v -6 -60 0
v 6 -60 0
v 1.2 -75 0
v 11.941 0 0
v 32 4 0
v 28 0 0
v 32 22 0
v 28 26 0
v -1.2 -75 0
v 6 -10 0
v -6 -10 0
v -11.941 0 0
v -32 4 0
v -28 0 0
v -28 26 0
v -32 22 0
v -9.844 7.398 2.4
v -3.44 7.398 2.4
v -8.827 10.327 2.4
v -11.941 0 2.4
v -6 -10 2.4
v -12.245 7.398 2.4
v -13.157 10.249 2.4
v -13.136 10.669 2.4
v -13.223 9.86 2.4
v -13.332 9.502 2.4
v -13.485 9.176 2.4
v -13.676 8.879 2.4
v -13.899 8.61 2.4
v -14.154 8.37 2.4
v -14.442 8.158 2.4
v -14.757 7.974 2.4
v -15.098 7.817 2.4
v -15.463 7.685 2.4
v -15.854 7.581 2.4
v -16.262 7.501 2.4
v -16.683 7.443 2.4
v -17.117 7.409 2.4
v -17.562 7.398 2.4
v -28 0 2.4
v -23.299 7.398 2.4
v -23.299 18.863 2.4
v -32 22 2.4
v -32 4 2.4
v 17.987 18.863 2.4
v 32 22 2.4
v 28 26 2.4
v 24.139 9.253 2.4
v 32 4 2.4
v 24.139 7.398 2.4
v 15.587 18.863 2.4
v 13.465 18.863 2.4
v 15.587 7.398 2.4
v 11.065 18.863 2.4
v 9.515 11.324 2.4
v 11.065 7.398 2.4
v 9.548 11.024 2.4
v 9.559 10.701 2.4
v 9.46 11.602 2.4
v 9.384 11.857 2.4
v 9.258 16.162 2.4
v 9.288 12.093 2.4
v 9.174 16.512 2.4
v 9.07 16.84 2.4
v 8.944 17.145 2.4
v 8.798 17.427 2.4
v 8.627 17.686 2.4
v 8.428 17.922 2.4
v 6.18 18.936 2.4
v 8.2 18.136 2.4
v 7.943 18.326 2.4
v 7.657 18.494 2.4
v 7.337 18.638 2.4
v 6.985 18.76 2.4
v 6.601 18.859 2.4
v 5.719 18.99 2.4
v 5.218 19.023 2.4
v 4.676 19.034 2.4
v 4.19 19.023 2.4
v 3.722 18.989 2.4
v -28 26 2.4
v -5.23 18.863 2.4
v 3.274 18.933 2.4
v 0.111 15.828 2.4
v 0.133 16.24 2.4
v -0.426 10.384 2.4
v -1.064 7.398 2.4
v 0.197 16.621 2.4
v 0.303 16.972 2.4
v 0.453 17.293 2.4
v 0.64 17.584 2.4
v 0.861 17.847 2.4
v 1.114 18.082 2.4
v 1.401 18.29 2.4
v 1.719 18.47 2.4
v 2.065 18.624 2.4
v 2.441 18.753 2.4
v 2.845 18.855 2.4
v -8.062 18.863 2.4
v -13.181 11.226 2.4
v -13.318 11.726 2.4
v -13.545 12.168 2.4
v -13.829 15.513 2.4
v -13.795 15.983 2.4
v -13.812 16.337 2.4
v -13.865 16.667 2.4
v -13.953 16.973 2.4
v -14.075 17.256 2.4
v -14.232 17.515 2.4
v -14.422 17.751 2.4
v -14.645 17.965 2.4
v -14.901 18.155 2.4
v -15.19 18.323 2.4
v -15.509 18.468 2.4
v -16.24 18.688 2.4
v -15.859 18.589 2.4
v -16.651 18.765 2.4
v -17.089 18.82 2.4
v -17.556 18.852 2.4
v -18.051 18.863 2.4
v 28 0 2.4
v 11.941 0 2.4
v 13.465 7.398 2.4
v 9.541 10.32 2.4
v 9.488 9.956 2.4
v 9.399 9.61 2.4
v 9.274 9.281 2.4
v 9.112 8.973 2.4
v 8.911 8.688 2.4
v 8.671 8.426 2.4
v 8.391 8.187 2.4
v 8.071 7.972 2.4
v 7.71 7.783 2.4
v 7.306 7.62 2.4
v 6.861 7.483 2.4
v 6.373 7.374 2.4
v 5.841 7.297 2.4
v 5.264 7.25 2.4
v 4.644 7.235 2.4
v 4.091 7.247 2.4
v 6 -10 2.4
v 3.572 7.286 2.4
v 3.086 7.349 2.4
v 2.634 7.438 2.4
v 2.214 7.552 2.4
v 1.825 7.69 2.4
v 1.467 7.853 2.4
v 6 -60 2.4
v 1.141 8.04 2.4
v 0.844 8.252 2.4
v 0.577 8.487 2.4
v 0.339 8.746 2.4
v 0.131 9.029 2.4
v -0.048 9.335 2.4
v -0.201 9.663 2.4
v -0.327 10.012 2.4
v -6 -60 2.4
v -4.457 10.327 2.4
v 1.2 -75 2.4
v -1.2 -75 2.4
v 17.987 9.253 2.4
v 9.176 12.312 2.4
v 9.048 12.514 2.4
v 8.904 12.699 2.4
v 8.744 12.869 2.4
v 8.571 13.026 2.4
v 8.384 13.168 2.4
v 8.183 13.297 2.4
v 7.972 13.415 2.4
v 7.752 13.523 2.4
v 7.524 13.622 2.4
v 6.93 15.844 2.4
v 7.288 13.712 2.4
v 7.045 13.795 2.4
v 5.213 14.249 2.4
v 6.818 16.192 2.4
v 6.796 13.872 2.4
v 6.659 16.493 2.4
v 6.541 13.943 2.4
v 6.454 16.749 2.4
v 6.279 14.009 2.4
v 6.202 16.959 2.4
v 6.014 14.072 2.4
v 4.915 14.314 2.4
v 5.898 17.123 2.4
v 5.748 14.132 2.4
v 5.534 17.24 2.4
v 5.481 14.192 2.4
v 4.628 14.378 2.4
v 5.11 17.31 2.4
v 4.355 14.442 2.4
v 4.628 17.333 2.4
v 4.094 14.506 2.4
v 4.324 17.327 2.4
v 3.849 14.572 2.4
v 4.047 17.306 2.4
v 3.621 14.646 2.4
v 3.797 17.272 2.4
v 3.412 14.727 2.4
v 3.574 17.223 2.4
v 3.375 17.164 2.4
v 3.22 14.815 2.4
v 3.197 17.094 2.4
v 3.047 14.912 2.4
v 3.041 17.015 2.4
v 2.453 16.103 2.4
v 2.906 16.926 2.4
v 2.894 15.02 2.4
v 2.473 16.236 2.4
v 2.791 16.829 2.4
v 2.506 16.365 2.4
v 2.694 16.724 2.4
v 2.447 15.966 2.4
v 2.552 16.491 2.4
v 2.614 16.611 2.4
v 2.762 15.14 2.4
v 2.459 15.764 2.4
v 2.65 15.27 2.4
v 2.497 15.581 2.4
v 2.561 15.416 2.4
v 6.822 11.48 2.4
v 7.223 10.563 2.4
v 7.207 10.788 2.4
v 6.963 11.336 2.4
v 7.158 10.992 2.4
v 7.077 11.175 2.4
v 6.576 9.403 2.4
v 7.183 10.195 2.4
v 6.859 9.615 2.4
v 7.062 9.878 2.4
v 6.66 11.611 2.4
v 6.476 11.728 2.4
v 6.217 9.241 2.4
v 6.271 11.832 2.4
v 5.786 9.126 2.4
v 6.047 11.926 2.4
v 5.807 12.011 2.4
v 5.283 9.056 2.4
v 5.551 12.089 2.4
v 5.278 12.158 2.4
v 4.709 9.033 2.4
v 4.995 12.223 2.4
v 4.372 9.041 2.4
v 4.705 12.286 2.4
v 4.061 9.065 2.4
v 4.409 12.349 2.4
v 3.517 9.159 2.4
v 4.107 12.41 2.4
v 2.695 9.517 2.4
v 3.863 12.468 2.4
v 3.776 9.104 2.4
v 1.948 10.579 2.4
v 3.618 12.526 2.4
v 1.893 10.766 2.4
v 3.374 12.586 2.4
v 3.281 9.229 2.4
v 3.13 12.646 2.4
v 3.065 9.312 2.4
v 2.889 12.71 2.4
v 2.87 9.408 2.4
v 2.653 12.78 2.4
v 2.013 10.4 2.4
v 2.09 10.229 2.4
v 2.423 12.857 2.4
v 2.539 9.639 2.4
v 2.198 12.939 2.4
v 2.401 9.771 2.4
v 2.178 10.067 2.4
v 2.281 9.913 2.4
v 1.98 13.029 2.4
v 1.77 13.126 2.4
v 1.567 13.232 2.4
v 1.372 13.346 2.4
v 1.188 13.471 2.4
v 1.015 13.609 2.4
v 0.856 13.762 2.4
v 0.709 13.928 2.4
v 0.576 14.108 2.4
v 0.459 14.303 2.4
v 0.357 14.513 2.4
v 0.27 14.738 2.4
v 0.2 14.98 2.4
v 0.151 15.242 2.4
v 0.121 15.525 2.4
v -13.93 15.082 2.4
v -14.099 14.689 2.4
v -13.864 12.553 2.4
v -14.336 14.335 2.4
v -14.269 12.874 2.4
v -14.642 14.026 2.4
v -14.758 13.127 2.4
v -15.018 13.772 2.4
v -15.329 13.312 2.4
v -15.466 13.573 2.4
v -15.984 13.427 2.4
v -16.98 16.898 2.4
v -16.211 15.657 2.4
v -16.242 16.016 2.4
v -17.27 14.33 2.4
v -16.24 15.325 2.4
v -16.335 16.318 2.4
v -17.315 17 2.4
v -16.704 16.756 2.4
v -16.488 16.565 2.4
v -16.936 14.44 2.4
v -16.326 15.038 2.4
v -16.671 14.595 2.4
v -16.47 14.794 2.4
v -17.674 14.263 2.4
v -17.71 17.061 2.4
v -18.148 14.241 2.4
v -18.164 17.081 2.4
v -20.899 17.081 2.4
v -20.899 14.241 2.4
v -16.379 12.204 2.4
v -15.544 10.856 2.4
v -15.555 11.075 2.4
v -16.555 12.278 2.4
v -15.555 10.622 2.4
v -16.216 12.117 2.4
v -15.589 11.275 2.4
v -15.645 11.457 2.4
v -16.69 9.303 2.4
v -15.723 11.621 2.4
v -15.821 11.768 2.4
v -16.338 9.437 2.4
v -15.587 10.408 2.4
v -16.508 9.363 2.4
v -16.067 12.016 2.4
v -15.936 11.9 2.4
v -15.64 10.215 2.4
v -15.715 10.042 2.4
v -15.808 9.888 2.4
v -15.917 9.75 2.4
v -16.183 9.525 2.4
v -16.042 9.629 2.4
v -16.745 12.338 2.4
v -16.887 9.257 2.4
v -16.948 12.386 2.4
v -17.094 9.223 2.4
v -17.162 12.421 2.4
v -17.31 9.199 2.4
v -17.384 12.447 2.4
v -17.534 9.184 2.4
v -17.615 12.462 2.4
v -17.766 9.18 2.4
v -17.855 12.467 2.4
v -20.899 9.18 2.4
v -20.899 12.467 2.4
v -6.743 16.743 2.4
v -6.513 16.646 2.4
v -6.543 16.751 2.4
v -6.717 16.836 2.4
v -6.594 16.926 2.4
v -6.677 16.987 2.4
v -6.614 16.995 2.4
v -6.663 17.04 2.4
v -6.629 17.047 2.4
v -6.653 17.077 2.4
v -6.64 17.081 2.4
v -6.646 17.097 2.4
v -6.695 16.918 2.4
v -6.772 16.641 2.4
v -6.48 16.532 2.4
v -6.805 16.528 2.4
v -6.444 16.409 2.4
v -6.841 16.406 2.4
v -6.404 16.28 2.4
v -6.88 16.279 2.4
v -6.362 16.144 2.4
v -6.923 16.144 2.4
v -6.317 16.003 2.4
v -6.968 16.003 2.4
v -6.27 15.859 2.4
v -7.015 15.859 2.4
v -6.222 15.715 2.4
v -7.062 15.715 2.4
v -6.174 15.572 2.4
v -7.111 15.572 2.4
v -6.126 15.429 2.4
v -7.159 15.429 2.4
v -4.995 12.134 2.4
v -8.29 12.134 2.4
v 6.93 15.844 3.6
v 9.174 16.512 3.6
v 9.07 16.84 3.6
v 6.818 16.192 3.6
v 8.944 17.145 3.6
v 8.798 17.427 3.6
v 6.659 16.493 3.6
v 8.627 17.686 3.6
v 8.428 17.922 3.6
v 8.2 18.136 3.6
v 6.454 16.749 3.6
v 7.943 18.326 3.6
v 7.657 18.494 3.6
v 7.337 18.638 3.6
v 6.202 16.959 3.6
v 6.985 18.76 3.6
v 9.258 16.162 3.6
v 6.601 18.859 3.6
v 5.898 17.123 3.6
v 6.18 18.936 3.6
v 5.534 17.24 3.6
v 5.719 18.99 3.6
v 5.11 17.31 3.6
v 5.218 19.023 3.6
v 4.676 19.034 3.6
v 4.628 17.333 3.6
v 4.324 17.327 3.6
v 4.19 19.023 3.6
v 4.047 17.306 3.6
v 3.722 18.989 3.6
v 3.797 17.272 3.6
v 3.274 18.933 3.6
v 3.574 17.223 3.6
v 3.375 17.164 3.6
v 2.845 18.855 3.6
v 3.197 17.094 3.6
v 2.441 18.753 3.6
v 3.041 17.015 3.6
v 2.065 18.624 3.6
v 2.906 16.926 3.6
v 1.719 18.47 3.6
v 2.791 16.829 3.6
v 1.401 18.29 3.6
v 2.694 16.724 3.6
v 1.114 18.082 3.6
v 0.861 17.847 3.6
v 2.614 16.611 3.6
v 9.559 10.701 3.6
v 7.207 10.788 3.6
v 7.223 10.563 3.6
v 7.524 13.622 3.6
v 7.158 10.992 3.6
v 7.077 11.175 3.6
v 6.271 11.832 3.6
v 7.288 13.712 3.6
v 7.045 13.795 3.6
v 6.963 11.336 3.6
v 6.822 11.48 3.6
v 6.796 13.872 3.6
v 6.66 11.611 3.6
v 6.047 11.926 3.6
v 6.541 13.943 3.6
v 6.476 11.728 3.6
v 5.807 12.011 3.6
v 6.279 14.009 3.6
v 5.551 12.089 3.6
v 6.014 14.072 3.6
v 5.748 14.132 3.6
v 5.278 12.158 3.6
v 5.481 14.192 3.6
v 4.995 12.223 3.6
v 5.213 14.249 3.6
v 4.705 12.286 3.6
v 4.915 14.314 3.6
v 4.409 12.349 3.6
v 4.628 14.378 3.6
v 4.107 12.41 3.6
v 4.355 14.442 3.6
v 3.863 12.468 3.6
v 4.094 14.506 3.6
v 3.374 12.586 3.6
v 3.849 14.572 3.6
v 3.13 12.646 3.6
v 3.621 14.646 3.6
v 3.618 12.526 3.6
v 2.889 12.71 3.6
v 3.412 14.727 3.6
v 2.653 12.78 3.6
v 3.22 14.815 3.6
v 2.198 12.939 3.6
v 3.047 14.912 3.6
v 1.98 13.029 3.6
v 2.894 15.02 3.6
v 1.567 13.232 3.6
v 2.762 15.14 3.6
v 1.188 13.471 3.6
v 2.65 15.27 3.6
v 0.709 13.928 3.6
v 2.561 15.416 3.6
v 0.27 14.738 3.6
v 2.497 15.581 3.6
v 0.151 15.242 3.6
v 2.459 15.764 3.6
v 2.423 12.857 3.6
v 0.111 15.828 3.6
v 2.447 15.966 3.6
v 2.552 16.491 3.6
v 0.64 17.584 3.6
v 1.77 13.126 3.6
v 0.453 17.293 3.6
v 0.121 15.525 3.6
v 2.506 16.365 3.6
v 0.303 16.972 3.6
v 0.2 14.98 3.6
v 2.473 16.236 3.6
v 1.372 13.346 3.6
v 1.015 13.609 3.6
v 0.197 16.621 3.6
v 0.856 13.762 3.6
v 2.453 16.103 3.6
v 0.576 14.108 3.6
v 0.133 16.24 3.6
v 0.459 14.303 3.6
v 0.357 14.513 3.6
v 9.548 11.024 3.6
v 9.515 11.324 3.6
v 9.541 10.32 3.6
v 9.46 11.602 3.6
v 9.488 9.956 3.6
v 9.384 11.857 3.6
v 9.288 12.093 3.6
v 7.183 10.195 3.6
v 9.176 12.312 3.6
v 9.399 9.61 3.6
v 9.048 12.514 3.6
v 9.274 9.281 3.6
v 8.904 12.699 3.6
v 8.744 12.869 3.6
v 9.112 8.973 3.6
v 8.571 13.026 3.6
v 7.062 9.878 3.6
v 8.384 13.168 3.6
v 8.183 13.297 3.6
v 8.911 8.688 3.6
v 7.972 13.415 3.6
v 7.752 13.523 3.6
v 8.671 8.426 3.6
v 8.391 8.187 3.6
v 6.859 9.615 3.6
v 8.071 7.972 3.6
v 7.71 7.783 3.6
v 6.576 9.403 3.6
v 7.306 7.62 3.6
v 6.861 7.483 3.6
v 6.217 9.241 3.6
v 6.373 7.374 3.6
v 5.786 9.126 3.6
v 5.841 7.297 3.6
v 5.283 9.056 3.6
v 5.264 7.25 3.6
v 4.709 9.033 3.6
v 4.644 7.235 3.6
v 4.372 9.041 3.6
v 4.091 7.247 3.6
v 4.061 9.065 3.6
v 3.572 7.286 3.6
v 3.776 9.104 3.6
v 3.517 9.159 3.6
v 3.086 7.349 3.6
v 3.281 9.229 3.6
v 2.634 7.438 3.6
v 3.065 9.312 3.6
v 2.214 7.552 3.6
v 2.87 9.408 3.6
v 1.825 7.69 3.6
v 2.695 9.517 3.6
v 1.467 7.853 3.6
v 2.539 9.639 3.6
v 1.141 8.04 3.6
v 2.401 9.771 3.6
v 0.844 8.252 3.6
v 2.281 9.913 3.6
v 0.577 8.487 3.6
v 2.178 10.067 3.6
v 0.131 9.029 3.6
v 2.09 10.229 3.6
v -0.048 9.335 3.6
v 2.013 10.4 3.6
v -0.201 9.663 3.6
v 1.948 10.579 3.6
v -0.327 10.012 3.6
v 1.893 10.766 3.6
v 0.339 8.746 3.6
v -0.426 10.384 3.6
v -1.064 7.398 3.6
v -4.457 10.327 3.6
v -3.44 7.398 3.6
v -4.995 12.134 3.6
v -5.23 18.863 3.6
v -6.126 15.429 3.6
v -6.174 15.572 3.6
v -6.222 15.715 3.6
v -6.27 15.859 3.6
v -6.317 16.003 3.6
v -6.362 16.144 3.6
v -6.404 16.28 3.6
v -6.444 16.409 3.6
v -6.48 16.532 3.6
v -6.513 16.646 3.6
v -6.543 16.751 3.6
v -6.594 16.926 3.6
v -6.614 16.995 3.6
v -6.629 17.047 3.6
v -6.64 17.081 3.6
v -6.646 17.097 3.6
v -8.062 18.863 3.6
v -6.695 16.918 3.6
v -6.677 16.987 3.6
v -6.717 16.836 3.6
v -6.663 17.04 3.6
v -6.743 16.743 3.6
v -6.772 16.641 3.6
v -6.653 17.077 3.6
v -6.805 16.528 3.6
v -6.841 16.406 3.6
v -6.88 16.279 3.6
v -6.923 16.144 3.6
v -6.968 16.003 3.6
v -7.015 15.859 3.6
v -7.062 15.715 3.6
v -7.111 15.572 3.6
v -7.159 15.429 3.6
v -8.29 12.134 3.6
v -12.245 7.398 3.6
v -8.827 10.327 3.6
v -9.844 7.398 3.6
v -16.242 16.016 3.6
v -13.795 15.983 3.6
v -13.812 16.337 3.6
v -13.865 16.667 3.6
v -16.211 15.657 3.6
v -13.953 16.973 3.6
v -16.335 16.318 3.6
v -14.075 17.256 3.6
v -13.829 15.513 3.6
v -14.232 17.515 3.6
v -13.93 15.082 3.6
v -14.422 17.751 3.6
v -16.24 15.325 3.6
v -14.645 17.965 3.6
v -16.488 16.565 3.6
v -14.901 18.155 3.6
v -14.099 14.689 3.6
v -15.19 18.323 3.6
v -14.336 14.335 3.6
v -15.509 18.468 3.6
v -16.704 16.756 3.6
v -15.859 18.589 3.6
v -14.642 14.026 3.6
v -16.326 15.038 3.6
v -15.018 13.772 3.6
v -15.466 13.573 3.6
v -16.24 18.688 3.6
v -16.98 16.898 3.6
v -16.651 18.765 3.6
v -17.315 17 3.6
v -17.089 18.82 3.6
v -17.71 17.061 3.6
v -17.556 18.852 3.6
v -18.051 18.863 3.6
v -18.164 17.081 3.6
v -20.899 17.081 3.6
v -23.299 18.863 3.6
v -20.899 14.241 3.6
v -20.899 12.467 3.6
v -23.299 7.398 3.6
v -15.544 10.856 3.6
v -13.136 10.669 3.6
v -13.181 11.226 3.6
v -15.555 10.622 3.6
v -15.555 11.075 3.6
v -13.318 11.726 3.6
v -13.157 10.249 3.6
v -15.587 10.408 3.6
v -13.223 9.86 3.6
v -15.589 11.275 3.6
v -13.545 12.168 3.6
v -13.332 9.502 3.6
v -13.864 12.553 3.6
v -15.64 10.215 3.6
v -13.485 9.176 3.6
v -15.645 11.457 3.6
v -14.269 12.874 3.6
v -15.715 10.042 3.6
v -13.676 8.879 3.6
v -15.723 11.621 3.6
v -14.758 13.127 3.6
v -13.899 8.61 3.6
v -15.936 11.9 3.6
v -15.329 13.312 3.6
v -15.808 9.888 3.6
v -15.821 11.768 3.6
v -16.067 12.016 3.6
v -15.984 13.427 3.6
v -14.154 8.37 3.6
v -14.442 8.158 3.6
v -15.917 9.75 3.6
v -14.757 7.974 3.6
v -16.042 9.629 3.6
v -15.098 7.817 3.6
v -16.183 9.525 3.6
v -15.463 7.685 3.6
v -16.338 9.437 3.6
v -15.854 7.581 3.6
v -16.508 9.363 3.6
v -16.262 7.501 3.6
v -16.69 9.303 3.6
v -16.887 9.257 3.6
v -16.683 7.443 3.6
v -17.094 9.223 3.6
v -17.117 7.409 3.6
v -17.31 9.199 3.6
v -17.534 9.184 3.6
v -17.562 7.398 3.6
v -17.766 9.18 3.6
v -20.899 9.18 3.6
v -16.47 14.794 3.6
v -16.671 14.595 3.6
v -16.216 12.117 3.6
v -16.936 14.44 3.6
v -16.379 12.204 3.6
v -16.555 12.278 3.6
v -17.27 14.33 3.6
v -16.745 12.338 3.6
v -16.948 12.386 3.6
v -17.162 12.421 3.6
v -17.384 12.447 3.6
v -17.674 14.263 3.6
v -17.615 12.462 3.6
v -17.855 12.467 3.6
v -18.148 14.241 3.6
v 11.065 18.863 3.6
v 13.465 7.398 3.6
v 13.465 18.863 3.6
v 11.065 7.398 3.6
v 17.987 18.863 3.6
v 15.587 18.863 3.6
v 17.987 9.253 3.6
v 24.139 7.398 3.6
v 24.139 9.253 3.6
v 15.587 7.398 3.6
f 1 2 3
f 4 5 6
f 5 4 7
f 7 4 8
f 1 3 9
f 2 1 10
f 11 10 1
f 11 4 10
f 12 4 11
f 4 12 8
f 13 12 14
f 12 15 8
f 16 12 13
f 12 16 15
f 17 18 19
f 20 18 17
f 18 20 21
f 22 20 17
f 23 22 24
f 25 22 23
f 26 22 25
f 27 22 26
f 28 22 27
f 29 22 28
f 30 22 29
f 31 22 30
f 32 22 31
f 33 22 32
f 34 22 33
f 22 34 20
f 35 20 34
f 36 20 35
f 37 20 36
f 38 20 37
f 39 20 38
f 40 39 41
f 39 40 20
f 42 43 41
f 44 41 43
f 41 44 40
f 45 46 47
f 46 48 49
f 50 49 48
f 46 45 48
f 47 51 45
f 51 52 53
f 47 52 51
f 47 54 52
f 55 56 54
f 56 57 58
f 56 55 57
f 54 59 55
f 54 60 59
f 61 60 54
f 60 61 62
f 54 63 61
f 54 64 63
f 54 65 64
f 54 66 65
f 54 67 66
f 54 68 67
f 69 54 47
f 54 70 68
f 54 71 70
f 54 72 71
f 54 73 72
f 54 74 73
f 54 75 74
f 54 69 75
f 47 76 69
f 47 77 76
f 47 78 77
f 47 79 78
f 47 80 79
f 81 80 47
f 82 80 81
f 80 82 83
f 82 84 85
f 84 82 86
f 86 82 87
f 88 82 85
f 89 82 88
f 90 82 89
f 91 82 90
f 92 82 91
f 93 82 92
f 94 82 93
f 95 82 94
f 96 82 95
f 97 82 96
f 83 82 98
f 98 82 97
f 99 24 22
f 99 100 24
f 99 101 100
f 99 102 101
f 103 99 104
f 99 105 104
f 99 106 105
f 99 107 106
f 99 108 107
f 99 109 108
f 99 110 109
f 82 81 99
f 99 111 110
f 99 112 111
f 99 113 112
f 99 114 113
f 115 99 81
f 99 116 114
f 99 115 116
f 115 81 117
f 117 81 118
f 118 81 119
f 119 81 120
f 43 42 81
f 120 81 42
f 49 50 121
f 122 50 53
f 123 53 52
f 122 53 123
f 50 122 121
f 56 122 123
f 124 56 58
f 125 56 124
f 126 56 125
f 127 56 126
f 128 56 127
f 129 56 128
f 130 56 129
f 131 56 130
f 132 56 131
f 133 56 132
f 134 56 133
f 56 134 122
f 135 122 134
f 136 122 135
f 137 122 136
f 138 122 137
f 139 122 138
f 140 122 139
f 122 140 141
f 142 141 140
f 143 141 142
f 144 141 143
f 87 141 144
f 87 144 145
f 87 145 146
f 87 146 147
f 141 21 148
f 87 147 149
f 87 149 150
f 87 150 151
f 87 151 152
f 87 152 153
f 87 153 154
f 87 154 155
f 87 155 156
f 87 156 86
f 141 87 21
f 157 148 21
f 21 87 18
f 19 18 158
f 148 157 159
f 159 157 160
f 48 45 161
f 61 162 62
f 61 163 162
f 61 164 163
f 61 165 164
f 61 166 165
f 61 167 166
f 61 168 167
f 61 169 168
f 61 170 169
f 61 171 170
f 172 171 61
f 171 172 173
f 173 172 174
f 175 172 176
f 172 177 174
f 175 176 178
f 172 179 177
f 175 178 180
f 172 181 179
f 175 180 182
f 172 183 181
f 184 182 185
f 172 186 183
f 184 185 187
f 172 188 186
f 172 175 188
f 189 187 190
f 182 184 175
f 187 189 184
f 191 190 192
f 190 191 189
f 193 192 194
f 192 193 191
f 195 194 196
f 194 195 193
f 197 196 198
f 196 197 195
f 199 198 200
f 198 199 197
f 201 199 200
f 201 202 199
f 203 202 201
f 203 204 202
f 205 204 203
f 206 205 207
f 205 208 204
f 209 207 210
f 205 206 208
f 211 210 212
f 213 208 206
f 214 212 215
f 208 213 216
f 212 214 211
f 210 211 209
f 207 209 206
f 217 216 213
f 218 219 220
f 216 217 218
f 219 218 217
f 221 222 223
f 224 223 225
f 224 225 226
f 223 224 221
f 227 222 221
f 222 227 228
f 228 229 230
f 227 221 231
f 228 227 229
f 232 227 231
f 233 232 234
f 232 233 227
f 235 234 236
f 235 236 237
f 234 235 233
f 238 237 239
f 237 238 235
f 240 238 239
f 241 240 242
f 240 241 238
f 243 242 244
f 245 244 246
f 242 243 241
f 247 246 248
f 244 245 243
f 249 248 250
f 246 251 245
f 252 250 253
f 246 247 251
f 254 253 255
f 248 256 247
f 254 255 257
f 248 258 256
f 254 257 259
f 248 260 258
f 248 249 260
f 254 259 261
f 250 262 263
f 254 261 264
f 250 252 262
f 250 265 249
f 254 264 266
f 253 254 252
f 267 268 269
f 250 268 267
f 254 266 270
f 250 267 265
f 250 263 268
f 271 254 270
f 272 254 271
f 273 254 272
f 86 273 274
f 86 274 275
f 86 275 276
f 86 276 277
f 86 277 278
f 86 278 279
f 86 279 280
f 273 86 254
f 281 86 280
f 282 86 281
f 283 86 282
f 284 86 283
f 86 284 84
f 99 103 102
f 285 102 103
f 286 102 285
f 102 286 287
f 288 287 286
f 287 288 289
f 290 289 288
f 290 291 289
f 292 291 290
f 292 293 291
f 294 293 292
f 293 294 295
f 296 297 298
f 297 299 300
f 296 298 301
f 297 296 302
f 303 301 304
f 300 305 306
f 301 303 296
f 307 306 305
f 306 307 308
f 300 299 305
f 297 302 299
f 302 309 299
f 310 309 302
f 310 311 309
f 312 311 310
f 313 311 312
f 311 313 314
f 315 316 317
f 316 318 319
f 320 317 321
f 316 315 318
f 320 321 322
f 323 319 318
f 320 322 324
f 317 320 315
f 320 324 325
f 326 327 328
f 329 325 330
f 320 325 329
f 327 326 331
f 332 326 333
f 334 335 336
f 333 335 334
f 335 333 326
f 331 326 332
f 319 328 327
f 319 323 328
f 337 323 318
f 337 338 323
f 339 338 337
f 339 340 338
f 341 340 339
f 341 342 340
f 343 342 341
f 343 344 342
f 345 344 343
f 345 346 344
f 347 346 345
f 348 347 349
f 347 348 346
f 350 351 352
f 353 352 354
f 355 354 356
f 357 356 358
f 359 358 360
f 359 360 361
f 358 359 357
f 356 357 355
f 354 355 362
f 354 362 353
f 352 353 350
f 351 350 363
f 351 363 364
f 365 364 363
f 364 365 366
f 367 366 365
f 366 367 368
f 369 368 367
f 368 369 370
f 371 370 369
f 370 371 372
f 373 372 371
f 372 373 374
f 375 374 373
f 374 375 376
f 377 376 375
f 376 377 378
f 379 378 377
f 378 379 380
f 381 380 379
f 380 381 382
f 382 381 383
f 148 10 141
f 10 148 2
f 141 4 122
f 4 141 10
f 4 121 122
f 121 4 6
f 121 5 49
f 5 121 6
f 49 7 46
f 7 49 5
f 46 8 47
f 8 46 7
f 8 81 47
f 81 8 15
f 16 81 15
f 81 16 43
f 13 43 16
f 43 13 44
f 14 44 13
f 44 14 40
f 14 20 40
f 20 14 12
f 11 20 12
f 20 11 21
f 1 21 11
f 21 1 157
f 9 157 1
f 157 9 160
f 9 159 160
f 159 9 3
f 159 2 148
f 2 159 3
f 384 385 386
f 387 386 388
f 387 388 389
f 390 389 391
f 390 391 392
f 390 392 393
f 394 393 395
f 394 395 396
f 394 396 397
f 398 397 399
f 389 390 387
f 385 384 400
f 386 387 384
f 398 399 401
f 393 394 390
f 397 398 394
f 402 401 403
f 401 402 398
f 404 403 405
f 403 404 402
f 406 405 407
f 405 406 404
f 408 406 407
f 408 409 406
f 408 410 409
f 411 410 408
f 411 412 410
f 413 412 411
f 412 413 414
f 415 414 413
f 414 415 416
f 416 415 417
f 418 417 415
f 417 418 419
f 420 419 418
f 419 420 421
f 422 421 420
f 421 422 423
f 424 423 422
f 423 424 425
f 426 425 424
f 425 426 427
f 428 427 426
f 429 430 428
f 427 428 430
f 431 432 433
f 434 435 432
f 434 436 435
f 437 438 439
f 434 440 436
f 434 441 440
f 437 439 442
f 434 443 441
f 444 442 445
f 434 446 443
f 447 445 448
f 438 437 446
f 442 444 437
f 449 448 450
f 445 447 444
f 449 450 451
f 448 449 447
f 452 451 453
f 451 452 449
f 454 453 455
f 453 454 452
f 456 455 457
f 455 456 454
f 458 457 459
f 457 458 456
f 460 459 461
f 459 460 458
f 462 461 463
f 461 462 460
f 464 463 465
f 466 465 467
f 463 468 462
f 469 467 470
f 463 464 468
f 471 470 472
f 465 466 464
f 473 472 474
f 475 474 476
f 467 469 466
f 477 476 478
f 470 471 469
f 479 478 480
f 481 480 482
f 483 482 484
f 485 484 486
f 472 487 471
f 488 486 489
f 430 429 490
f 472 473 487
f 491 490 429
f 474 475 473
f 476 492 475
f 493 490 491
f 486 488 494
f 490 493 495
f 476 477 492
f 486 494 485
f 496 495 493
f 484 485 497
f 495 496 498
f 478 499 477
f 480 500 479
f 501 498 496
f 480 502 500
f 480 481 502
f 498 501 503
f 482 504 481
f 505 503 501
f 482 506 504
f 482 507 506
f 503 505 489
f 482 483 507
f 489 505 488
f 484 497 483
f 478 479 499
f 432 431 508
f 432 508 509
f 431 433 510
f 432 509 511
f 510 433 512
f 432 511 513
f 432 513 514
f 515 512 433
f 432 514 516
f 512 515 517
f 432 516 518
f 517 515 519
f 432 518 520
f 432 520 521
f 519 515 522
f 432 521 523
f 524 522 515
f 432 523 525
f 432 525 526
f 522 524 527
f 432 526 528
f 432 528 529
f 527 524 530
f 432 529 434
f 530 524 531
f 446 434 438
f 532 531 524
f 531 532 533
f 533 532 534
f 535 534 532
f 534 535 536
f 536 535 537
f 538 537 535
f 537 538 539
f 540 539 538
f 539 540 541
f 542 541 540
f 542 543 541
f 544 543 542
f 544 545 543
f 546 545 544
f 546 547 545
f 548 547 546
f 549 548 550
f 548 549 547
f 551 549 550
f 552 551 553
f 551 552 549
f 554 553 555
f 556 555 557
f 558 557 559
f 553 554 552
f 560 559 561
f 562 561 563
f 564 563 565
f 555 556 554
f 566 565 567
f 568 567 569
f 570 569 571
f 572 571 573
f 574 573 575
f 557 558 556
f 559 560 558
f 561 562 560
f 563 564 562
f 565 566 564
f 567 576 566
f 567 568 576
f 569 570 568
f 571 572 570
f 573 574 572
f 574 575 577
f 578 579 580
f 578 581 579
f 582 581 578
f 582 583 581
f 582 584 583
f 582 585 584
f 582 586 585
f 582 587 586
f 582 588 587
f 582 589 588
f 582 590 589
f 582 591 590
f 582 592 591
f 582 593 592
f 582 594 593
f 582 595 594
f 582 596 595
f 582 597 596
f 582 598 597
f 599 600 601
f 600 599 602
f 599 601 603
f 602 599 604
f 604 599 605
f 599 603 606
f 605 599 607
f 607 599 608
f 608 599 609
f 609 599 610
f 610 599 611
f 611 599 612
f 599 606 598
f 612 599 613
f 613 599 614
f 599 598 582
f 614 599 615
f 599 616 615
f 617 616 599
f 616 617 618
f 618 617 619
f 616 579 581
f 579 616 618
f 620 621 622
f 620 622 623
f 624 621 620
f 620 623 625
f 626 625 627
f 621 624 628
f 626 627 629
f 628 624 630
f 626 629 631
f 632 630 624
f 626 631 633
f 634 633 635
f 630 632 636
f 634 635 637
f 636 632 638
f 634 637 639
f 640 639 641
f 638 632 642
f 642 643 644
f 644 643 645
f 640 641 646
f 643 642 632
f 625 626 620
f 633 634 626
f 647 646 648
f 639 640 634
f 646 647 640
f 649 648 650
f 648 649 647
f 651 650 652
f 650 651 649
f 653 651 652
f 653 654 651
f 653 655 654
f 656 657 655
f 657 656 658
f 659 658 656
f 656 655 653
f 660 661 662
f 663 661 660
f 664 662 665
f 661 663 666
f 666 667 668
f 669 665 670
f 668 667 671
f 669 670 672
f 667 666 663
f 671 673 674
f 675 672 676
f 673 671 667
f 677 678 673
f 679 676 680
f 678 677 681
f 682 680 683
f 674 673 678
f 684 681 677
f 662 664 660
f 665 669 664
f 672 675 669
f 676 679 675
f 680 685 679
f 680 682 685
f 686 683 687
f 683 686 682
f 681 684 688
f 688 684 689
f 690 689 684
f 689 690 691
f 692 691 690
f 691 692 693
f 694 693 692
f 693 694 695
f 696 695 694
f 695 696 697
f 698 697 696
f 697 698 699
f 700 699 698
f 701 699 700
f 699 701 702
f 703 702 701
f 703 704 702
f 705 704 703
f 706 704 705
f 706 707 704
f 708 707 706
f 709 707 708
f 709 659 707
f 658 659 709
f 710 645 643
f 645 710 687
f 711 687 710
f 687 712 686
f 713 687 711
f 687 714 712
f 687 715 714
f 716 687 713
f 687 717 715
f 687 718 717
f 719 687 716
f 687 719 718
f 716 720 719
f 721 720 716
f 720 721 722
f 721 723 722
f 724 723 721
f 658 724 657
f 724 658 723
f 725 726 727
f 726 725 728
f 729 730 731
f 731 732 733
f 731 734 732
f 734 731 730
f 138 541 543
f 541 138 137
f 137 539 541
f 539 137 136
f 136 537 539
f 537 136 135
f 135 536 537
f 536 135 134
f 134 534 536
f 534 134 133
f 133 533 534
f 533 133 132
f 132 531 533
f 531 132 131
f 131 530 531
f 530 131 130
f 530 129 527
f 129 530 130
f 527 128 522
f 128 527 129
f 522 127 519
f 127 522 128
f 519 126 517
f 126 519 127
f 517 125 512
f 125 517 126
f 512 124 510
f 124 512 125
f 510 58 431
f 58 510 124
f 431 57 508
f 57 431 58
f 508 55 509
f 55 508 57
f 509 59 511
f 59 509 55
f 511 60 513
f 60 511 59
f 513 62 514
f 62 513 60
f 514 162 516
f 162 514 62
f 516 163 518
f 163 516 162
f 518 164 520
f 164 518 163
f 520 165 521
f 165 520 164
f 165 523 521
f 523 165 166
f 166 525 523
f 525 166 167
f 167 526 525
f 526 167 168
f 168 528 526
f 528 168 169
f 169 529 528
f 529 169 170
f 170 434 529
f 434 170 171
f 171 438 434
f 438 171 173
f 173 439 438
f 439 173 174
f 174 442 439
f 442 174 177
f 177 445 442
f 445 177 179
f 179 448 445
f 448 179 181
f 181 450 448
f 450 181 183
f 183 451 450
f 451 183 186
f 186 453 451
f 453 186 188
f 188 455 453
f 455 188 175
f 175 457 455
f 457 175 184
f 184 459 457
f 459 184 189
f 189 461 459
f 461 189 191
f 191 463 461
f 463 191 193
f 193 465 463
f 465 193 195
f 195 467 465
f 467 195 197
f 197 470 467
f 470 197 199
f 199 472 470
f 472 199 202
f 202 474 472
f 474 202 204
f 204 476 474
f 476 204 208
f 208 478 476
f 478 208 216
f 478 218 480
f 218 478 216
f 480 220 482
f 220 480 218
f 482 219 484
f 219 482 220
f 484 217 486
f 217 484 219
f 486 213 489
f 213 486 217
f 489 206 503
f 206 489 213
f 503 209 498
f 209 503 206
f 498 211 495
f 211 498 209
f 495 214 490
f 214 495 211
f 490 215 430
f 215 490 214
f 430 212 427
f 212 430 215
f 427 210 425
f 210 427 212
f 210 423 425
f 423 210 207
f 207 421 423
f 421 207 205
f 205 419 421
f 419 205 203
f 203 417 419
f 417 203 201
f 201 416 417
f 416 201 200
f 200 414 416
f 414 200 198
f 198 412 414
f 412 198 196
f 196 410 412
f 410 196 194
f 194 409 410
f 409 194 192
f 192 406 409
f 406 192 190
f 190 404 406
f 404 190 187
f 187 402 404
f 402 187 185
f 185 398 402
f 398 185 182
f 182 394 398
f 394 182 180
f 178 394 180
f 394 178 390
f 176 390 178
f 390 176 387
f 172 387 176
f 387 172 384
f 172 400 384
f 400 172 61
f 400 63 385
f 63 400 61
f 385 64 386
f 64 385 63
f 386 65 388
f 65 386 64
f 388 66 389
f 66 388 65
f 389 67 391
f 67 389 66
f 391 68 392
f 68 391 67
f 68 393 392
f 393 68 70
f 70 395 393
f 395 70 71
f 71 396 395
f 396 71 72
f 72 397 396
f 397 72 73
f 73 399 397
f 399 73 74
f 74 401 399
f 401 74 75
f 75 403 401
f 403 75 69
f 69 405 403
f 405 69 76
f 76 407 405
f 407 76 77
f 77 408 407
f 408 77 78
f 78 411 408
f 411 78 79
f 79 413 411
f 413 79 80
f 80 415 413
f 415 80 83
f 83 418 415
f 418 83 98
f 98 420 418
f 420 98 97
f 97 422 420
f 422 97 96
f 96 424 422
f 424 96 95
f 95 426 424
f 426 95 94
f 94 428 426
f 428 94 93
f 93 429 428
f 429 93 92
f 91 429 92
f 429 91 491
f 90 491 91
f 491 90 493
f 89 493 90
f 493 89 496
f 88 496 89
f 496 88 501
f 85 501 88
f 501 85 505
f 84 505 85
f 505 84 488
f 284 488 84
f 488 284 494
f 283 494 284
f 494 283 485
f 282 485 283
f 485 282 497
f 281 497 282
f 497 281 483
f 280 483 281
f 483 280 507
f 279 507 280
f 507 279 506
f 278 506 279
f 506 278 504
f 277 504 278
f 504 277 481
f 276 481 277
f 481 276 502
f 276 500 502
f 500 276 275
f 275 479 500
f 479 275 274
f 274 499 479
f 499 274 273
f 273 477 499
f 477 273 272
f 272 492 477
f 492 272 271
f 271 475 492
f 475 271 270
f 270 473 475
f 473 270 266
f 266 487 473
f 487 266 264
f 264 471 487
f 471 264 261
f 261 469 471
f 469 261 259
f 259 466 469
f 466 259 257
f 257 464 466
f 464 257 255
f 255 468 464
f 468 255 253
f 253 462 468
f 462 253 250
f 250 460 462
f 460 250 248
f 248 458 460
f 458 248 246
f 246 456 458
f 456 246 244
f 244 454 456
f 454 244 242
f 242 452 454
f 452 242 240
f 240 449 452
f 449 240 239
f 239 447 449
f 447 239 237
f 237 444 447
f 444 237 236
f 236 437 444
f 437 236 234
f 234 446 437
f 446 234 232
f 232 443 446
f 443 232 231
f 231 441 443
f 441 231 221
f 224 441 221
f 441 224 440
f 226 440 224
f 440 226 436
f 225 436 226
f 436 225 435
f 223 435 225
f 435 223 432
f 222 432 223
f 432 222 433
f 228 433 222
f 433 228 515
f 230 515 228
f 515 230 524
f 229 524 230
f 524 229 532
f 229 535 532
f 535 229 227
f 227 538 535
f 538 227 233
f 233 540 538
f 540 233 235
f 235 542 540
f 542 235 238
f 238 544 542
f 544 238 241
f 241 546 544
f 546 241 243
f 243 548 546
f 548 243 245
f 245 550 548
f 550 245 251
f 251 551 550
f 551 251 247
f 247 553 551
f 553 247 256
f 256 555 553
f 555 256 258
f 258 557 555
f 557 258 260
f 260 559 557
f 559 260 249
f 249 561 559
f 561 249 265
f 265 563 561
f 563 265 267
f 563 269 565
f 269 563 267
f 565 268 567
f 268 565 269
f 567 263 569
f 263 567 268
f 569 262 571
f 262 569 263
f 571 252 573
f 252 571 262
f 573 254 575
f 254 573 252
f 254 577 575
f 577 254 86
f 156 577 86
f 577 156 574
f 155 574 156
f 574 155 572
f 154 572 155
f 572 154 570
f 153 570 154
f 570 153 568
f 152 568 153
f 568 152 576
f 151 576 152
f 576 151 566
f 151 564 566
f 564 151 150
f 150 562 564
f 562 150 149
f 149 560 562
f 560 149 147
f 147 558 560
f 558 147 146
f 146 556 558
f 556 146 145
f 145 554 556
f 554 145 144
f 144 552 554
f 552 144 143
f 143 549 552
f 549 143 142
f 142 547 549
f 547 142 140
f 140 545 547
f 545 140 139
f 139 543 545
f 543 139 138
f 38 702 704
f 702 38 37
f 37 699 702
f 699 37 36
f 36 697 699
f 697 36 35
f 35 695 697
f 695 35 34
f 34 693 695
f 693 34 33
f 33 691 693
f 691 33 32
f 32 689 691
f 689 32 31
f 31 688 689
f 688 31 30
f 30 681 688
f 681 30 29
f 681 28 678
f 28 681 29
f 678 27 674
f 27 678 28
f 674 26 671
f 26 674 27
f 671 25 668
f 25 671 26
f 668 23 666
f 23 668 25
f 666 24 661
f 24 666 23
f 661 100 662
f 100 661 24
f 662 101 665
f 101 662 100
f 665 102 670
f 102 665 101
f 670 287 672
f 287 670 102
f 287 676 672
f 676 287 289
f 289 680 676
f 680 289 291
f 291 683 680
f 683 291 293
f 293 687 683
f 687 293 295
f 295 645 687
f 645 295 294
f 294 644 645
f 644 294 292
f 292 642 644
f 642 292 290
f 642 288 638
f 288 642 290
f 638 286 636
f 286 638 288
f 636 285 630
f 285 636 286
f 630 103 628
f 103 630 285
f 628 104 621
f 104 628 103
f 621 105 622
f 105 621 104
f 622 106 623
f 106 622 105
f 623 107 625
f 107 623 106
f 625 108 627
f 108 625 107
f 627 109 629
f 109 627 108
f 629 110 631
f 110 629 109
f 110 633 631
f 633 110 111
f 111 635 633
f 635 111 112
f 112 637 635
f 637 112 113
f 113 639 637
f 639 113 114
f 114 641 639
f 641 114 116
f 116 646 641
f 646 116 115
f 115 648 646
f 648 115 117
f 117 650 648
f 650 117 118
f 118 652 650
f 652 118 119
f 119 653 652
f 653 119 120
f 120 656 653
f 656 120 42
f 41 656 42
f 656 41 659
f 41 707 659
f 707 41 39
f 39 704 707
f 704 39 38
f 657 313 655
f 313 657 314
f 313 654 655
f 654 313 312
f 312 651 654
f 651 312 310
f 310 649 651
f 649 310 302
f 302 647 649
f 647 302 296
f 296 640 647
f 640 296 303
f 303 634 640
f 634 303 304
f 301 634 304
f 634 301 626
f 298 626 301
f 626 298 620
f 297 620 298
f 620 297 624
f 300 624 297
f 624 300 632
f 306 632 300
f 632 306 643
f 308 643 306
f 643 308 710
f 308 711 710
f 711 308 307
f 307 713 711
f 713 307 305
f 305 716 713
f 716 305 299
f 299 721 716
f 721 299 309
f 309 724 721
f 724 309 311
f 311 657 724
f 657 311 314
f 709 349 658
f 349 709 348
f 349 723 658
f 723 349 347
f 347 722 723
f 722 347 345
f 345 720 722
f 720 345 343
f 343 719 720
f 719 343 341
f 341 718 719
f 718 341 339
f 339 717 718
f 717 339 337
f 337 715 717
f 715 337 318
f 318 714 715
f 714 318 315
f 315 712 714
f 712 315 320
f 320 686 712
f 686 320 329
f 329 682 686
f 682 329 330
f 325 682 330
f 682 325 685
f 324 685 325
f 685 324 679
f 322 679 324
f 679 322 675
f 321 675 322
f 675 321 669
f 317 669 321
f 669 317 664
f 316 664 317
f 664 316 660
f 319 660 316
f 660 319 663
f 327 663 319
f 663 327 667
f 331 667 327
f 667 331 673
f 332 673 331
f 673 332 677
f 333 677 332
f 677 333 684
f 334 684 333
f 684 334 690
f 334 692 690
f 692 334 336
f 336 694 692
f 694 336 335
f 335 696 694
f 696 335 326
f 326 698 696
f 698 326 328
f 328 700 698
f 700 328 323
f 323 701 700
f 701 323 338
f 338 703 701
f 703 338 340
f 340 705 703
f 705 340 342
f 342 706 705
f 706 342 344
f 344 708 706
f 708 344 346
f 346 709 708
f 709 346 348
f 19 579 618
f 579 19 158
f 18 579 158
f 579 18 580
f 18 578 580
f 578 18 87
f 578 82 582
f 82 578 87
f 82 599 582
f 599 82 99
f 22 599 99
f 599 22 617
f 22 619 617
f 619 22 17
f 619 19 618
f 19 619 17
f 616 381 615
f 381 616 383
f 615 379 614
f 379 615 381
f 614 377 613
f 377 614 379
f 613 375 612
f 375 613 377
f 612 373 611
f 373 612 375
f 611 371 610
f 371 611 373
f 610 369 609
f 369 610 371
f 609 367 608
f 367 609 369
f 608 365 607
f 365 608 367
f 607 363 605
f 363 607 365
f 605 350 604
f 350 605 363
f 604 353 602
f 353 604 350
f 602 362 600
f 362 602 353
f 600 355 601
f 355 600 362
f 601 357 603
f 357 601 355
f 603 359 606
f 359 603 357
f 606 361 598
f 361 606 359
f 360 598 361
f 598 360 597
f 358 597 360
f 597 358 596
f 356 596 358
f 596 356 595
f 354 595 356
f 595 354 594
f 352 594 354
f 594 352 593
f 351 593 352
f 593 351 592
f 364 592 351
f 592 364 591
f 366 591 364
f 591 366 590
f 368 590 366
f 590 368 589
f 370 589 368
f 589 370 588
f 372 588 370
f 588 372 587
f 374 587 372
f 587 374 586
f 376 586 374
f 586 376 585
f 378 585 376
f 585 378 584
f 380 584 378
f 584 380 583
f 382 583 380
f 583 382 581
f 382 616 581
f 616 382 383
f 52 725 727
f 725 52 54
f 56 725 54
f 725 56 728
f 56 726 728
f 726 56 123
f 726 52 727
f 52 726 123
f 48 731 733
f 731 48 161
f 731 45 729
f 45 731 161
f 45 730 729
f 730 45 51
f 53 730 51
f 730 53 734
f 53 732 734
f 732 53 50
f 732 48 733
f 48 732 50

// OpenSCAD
// Raised-text herb label with an integral garden stake; print lettering up.
// The wide shoulder and blunt spear tip resist bending while pushing into soil.
label = "BASIL"; // Plant name
font_name = "Liberation Sans:style=Bold"; // Font family and style
label_width = 64; // Sign width, mm [56:2:90]
label_height = 26; // Sign height, mm [24:2:36]
stake_length = 75; // Stake length below sign, mm [55:5:110]
stake_width = 12; // Stake shaft width, mm [10:1:16]
tip_length = 15; // Spear tip length, mm [10:1:20]
tip_width = 2.4; // Blunt tip width, mm [1.2:0.2:4]
thickness = 2.4; // Plate and stake thickness, mm [1.6:0.2:4]
letter_size = 12; // Text size, mm [10:1:16]
letter_height = 1.2; // Raised letter thickness, mm [1.2:0.2:2]
corner = 4; // Label corner chamfer, mm [3:1:6]
shoulder_length = 10; // Stake shoulder transition, mm [8:1:16]
cut_extra = 0.1; // Letter overlap, mm

module label_outline() {
    polygon([[-label_width/2+corner,0],[label_width/2-corner,0],
             [label_width/2,corner],[label_width/2,label_height-corner],
             [label_width/2-corner,label_height],[-label_width/2+corner,label_height],
             [-label_width/2,label_height-corner],[-label_width/2,corner]]);
}

module stake_outline() {
    polygon([[-stake_width,cut_extra],[stake_width,cut_extra],
             [stake_width/2,-shoulder_length],
             [stake_width/2,-stake_length+tip_length],[tip_width/2,-stake_length],
             [-tip_width/2,-stake_length],[-stake_width/2,-stake_length+tip_length],
             [-stake_width/2,-shoulder_length]]);
}

color("#89c454") union() {
    linear_extrude(thickness) union() {
        label_outline();
        stake_outline();
    }
    // Raised lettering in a second colour, still one printed part.
    color("#d9dde2") translate([0,label_height/2,thickness-cut_extra])
        linear_extrude(letter_height+cut_extra)
            text(label,size=letter_size,font=font_name,halign="center",valign="center");
}
